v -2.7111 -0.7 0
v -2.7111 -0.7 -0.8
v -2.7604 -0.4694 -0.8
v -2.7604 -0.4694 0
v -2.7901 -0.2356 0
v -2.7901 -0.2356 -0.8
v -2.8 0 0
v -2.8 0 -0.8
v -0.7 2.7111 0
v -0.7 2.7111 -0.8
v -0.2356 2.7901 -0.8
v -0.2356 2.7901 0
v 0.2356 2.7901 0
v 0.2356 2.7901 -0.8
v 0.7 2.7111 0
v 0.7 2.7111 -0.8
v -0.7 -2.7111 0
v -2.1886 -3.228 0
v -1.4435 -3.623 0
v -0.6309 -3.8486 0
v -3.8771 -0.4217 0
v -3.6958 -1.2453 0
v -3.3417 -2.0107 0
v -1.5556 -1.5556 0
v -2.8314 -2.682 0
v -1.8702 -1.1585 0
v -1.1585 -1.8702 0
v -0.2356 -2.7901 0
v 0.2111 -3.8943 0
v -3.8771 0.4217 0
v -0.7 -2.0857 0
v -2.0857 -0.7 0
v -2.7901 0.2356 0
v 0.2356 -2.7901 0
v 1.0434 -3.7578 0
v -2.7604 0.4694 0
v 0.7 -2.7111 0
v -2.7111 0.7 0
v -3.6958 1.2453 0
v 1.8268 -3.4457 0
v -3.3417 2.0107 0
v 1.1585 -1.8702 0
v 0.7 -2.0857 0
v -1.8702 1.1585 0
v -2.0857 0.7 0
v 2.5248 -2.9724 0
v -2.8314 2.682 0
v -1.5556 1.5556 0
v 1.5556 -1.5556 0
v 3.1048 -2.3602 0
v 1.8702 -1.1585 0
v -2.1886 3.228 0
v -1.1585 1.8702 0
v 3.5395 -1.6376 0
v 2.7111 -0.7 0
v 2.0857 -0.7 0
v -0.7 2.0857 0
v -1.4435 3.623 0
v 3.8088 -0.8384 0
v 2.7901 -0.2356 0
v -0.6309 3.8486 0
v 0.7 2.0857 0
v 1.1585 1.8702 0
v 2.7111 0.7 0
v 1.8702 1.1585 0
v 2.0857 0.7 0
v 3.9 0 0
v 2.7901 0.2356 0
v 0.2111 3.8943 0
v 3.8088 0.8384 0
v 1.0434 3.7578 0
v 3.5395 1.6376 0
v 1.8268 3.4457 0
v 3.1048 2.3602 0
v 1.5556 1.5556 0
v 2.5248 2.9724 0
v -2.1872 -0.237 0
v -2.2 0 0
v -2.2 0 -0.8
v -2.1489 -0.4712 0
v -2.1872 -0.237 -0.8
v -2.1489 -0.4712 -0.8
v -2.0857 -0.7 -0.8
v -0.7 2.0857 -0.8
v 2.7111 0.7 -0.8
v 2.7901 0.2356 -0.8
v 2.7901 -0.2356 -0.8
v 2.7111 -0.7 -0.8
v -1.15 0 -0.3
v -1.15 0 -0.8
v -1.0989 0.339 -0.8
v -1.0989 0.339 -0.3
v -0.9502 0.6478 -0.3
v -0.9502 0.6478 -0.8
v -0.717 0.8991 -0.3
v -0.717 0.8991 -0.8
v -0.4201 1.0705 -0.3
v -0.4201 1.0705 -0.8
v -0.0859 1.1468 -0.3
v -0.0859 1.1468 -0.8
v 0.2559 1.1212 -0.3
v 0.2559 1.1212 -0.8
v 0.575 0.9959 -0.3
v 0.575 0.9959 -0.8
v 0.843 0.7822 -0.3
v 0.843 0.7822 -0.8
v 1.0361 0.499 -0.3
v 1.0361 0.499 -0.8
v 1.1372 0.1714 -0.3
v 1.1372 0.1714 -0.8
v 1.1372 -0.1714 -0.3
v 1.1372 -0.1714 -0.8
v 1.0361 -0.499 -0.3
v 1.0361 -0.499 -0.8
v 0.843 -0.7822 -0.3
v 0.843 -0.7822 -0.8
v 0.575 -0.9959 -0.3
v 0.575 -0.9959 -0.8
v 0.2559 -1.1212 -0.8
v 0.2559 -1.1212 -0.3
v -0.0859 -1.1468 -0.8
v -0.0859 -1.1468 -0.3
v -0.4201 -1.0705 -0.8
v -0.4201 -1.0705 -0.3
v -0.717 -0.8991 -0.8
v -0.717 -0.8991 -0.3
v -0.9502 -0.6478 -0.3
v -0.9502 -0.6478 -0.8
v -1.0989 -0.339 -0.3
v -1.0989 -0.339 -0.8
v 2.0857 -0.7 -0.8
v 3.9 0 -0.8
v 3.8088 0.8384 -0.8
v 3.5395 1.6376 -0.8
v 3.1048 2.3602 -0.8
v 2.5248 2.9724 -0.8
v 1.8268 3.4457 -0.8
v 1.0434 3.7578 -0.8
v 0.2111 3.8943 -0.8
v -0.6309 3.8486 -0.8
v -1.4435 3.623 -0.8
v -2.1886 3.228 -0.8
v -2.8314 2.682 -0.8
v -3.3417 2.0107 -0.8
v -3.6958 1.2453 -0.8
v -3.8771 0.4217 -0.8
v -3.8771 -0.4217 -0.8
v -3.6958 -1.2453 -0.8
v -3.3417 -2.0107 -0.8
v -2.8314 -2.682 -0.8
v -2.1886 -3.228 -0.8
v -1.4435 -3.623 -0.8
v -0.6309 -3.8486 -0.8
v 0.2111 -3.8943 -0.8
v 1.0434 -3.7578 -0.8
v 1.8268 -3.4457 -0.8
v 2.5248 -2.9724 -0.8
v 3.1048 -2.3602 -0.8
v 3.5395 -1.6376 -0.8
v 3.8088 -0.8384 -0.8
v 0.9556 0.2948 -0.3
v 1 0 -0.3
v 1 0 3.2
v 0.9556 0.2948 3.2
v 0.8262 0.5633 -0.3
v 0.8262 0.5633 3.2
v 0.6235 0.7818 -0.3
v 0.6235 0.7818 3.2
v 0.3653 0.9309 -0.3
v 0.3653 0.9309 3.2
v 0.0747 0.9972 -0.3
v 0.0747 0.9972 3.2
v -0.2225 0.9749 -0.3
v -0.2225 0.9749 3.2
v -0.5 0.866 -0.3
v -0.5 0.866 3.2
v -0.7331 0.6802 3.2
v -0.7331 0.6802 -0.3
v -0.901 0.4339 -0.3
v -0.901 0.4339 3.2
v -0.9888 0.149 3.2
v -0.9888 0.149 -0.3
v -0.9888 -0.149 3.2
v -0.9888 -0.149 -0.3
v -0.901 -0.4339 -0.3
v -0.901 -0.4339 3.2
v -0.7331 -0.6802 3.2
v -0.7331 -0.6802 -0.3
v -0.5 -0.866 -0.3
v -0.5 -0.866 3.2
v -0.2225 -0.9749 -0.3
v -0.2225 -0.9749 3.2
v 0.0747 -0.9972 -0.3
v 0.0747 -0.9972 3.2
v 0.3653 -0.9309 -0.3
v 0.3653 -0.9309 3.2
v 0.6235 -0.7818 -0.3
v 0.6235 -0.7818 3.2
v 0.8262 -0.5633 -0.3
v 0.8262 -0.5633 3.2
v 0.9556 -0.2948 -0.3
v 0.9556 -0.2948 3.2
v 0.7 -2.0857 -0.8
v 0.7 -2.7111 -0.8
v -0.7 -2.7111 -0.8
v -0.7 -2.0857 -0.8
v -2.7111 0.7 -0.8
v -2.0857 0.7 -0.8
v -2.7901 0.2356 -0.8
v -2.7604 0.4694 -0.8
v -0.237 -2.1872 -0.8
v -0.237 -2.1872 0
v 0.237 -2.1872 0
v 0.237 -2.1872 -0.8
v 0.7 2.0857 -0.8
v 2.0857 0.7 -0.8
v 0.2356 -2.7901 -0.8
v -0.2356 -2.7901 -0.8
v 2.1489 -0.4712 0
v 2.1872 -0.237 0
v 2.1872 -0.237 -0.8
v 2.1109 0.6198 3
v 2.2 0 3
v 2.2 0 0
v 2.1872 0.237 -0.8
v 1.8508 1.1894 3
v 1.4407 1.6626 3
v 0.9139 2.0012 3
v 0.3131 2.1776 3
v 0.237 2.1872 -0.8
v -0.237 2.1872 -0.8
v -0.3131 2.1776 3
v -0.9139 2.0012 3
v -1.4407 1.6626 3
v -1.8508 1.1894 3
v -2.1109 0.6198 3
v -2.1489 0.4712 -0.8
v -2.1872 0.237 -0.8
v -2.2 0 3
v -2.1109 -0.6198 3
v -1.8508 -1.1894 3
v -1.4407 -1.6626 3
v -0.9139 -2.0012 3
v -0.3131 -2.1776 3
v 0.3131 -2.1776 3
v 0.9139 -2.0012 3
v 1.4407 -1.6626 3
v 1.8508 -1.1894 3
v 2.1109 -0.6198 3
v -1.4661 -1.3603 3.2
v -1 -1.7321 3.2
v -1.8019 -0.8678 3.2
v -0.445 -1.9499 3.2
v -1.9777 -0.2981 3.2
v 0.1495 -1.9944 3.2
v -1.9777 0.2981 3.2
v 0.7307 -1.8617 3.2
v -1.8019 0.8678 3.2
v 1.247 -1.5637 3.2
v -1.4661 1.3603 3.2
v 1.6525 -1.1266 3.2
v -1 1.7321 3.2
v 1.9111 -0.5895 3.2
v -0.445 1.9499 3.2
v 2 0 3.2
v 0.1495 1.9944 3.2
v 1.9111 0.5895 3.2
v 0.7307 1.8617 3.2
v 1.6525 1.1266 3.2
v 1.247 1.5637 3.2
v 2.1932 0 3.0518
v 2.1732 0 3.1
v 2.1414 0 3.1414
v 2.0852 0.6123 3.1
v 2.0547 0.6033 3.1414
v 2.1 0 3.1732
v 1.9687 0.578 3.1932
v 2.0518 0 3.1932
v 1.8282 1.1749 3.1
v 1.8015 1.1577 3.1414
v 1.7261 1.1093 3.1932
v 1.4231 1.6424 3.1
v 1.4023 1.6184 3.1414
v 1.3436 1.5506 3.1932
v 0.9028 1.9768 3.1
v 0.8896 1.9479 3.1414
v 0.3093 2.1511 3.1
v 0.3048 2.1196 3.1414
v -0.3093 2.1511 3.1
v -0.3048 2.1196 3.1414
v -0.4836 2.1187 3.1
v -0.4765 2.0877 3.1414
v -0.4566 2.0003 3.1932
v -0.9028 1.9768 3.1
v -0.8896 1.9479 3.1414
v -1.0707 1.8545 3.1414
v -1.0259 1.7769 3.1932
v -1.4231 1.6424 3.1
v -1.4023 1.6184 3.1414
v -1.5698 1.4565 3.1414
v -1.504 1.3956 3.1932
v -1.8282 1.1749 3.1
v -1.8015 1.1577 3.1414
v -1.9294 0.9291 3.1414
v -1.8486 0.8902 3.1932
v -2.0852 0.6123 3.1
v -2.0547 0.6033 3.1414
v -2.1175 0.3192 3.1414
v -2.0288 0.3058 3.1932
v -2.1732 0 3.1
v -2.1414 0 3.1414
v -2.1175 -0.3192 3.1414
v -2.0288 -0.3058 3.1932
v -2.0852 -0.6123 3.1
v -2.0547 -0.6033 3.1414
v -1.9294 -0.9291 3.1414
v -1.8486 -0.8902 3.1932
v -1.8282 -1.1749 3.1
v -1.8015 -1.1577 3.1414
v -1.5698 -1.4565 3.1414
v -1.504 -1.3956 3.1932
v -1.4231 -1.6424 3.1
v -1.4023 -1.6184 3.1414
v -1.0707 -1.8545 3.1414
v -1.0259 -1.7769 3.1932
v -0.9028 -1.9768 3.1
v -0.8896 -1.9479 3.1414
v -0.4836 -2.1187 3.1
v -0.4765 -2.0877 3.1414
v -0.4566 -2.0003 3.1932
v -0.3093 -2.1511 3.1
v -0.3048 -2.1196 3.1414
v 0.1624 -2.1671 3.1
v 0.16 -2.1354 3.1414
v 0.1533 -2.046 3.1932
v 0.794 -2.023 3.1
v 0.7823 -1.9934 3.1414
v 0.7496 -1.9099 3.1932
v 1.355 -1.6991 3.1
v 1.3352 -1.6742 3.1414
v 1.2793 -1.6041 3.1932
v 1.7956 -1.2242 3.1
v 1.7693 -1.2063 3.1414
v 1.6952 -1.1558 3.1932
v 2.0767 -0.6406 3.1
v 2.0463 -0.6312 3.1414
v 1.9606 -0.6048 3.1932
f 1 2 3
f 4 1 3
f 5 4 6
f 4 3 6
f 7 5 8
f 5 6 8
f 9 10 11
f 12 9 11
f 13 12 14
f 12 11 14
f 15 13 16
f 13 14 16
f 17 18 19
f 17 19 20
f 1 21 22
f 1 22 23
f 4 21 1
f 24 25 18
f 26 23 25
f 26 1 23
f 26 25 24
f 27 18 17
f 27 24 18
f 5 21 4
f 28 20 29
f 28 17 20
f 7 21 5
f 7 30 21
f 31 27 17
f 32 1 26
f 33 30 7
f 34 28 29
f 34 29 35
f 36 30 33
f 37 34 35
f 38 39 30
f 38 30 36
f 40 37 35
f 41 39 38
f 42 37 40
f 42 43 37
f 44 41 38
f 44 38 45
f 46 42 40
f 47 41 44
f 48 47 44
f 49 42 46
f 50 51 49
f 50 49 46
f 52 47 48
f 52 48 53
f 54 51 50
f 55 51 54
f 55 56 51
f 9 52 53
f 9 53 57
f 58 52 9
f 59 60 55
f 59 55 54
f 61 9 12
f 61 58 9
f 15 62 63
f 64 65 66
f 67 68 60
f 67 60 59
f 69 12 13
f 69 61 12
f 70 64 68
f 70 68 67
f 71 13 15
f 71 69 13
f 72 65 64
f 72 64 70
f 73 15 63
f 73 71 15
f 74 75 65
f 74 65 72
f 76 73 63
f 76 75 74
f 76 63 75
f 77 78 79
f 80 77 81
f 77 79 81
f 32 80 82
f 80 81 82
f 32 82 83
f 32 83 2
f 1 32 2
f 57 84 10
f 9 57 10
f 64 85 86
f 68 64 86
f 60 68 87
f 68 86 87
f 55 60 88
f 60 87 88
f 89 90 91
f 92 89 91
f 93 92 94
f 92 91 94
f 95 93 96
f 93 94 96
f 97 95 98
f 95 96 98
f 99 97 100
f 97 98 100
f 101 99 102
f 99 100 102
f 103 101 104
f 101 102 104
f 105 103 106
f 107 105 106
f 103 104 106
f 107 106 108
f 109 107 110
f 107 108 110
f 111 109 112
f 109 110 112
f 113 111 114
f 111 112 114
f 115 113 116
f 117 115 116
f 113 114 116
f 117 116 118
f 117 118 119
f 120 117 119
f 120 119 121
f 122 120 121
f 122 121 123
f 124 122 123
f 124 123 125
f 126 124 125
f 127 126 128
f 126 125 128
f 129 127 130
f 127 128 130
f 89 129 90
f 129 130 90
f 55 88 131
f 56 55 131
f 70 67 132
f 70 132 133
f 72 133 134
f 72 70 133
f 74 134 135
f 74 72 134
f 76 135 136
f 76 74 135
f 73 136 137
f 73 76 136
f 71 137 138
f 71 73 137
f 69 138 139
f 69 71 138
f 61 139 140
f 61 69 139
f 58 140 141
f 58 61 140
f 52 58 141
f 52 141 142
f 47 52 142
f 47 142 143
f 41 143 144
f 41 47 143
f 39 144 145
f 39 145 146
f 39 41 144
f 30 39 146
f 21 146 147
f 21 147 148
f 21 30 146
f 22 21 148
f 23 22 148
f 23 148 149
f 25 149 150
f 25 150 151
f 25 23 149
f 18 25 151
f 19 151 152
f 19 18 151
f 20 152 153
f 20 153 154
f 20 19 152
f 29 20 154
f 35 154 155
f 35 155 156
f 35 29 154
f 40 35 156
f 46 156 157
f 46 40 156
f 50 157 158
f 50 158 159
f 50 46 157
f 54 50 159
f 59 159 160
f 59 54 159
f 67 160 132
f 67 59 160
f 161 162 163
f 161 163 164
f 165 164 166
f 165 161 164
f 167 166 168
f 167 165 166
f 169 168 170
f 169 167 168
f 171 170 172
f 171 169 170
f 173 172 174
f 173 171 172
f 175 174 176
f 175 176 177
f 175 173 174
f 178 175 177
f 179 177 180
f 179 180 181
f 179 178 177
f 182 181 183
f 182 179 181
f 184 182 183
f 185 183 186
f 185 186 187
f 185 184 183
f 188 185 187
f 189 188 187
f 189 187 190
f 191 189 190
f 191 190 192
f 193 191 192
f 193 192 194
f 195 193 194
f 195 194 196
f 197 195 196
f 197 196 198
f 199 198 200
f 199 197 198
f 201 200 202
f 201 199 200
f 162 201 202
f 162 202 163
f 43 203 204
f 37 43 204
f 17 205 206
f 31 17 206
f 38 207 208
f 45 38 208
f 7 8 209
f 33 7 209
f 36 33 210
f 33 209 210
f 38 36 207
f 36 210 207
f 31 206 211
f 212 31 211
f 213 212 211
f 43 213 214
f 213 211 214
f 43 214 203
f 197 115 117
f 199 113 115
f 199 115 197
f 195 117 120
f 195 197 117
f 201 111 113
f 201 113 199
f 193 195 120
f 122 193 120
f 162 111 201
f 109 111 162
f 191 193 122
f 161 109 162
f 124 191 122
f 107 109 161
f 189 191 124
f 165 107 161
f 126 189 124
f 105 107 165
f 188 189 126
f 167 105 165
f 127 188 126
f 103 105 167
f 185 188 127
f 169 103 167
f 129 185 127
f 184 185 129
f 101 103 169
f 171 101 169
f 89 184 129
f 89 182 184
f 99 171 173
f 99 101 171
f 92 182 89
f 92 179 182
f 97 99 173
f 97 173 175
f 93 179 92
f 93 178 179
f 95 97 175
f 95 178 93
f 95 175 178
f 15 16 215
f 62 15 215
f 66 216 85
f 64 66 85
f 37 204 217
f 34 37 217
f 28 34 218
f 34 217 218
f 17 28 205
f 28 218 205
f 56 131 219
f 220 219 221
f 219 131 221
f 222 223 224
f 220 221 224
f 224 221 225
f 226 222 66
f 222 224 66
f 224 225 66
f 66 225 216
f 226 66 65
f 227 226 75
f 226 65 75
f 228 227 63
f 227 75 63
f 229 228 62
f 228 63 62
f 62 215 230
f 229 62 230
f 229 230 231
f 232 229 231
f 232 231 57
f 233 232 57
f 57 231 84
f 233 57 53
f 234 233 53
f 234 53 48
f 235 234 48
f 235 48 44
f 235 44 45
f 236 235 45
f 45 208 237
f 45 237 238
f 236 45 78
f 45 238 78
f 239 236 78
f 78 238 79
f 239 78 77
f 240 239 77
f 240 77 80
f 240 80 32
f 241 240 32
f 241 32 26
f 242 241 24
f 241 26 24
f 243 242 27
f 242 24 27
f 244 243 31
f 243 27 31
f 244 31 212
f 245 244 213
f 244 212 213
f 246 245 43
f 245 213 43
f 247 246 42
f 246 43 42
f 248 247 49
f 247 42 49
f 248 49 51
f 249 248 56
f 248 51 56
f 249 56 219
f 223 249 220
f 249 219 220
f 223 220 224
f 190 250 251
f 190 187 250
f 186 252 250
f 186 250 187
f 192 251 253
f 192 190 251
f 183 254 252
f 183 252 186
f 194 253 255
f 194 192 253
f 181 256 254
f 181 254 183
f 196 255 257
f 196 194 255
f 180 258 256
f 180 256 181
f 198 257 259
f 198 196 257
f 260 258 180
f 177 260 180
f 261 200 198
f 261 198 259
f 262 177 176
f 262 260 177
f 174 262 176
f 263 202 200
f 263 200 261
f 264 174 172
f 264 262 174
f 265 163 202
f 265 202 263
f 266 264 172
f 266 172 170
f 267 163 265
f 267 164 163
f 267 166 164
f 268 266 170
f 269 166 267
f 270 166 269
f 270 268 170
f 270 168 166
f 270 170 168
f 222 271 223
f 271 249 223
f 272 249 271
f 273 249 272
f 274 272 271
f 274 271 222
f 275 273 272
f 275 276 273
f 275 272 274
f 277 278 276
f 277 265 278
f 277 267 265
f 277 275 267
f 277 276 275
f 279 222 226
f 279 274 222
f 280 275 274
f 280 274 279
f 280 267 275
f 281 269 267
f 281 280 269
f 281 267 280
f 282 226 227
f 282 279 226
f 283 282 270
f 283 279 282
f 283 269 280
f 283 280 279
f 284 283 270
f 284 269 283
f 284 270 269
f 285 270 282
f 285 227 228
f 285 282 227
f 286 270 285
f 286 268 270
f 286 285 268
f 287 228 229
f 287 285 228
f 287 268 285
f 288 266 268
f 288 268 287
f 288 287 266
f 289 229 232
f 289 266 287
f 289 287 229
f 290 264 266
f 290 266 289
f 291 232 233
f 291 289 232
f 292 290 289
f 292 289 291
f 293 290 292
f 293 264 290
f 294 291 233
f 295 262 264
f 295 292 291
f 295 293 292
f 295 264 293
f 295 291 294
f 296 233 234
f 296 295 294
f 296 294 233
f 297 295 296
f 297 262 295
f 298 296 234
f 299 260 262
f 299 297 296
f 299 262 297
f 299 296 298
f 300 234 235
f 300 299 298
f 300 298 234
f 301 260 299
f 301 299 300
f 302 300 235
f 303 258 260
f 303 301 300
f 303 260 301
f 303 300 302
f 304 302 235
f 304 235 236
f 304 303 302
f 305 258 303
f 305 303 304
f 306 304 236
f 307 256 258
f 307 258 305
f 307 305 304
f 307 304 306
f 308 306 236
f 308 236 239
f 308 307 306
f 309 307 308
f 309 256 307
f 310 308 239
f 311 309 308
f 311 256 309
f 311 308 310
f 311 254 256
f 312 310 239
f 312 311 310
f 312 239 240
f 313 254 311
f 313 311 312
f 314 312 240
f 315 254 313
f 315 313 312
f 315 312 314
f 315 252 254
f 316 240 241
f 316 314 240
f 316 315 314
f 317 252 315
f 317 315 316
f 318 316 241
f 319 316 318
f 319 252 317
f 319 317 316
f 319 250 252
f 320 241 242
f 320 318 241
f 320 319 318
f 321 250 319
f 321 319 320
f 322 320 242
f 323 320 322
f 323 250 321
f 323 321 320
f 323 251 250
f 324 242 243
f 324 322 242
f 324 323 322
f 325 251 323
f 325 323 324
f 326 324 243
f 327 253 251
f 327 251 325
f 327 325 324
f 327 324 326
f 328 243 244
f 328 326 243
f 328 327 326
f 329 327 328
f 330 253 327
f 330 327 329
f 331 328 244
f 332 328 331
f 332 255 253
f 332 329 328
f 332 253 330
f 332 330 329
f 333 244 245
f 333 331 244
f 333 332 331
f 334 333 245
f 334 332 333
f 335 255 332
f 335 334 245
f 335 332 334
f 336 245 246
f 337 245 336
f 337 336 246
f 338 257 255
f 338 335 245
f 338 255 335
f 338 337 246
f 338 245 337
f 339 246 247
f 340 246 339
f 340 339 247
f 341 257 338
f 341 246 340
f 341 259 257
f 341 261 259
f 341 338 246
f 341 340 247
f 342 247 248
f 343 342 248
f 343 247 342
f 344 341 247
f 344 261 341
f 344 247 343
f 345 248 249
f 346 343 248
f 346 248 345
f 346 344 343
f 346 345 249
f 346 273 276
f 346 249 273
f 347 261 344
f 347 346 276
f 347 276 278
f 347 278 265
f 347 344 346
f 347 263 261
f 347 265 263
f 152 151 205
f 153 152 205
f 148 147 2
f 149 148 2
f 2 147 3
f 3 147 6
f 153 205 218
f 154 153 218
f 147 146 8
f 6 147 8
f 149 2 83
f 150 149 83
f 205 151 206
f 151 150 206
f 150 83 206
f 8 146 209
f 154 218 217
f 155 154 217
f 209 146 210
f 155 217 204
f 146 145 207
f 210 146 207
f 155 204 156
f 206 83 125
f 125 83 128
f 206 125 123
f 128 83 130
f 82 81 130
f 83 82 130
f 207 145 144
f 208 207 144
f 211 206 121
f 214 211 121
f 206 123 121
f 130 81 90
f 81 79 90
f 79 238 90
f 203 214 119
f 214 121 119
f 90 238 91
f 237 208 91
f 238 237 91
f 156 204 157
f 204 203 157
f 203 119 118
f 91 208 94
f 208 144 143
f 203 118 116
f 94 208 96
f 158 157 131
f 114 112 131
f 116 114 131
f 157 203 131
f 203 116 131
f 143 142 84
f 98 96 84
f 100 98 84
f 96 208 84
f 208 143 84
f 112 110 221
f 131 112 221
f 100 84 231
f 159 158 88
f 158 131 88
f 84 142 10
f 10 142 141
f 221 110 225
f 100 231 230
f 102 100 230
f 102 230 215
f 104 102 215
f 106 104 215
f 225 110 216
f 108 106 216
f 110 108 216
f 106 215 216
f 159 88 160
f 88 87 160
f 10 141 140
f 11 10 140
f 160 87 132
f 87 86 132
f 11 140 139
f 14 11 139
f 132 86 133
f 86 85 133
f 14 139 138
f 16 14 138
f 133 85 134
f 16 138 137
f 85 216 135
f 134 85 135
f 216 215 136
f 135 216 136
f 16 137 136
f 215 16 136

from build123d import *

# Parameters (mm, degrees)
SKETCH_1_R          = 3.9
SKETCH_1_R_2        = 2.2
SKETCH_1_R_3        = 1
EXTRUDE_1_DEPTH     = 0.8
SKETCH_1_4_R        = 2.2
SKETCH_1_4_R_2      = 1
EXTRUDE_2_DEPTH     = 3.2
FILLET_1_R          = 0.2
SKETCH_2_R          = 1.15
CUT_EXTRUDE_1_DEPTH = 0.5
CUT_EXTRUDE_2_REACH = 8.813


with BuildPart() as part:
    # Sketch 1 → Extrude 1 (new body)
    with BuildSketch(Plane.XY):
        Circle(SKETCH_1_R)
        Circle(SKETCH_1_R_2, mode=Mode.SUBTRACT)
        Circle(SKETCH_1_R_2)
        Circle(SKETCH_1_R_3, mode=Mode.SUBTRACT)
    extrude(amount=-EXTRUDE_1_DEPTH)

    # Sketch 1_4 → Extrude 2 (add)
    with BuildSketch(Plane.XY):
        Circle(SKETCH_1_4_R)
        Circle(SKETCH_1_4_R_2, mode=Mode.SUBTRACT)
    extrude(amount=EXTRUDE_2_DEPTH)

    # Fillet 1
    fillet_1_edges = [part.edges().sort_by_distance(p)[0] for p in [
        (-2.2, 0, 3.2),
    ]]
    fillet(fillet_1_edges, radius=FILLET_1_R)

    # Sketch 2 → Cut-Extrude 1 (cut)
    with BuildSketch(Plane(origin=(0, 0, -0.8), x_dir=(-1, 0, 0), z_dir=(0, 0, -1))):
        Circle(SKETCH_2_R)
    extrude(amount=-CUT_EXTRUDE_1_DEPTH, mode=Mode.SUBTRACT)

    # Sketch 3 → Cut-Extrude 2 (cut, up to next)
    with BuildSketch(Plane(origin=(0, 0, -0.8), x_dir=(-1, 0, 0), z_dir=(0, 0, -1)), mode=Mode.PRIVATE) as cut_extrude_2_sk1:
        with BuildLine():
            Line((-0.7, -2.085665361), (-0.7, -2.711088342))
            ThreePointArc((-0.7, -2.711088342), (0, -2.8), (0.7, -2.711088342))
            Line((0.7, -2.711088342), (0.7, -2.085665361))
            ThreePointArc((0.7, -2.085665361), (0, -2.2), (-0.7, -2.085665361))
        make_face()
    cut_extrude_2_tool1 = extrude(cut_extrude_2_sk1.sketch, amount=-CUT_EXTRUDE_2_REACH, mode=Mode.PRIVATE) & part.part
    # Sketch 3 → Cut-Extrude 2 (cut, up to next)
    with BuildSketch(Plane(origin=(0, 0, -0.8), x_dir=(-1, 0, 0), z_dir=(0, 0, -1)), mode=Mode.PRIVATE) as cut_extrude_2_sk2:
        with BuildLine():
            ThreePointArc((0.7, 2.711088342), (0, 2.8), (-0.7, 2.711088342))
            Line((-0.7, 2.711088342), (-0.7, 2.085665361))
            ThreePointArc((-0.7, 2.085665361), (0, 2.2), (0.7, 2.085665361))
            Line((0.7, 2.085665361), (0.7, 2.711088342))
        make_face()
    cut_extrude_2_tool2 = extrude(cut_extrude_2_sk2.sketch, amount=-CUT_EXTRUDE_2_REACH, mode=Mode.PRIVATE) & part.part
    # Sketch 3 → Cut-Extrude 2 (cut, up to next)
    with BuildSketch(Plane(origin=(0, 0, -0.8), x_dir=(-1, 0, 0), z_dir=(0, 0, -1)), mode=Mode.PRIVATE) as cut_extrude_2_sk3:
        with BuildLine():
            Line((-0.7, -2.085665361), (-0.7, -2.711088342))
            ThreePointArc((-0.7, -2.711088342), (0, -2.8), (0.7, -2.711088342))
            Line((0.7, -2.711088342), (0.7, -2.085665361))
            ThreePointArc((0.7, -2.085665361), (0, -2.2), (-0.7, -2.085665361))
        make_face()
    cut_extrude_2_tool3 = extrude(cut_extrude_2_sk3.sketch, amount=-CUT_EXTRUDE_2_REACH, mode=Mode.PRIVATE) & part.part
    # Sketch 3 → Cut-Extrude 2 (cut, up to next)
    with BuildSketch(Plane(origin=(0, 0, -0.8), x_dir=(-1, 0, 0), z_dir=(0, 0, -1)), mode=Mode.PRIVATE) as cut_extrude_2_sk4:
        with BuildLine():
            ThreePointArc((0.7, 2.711088342), (0, 2.8), (-0.7, 2.711088342))
            Line((-0.7, 2.711088342), (-0.7, 2.085665361))
            ThreePointArc((-0.7, 2.085665361), (0, 2.2), (0.7, 2.085665361))
            Line((0.7, 2.085665361), (0.7, 2.711088342))
        make_face()
    cut_extrude_2_tool4 = extrude(cut_extrude_2_sk4.sketch, amount=-CUT_EXTRUDE_2_REACH, mode=Mode.PRIVATE) & part.part
    # Sketch 3 → Cut-Extrude 2 (cut, up to next)
    with BuildSketch(Plane(origin=(0, 0, -0.8), x_dir=(-1, 0, 0), z_dir=(0, 0, -1)), mode=Mode.PRIVATE) as cut_extrude_2_sk5:
        with BuildLine():
            ThreePointArc((-2.711088342, 0.7), (-2.8, 0), (-2.711088342, -0.7))
            Line((-2.711088342, -0.7), (-2.085665361, -0.7))
            ThreePointArc((-2.085665361, -0.7), (-2.2, 0), (-2.085665361, 0.7))
            Line((-2.085665361, 0.7), (-2.711088342, 0.7))
        make_face()
    cut_extrude_2_tool5 = extrude(cut_extrude_2_sk5.sketch, amount=-CUT_EXTRUDE_2_REACH, mode=Mode.PRIVATE) & part.part
    # Sketch 3 → Cut-Extrude 2 (cut, up to next)
    with BuildSketch(Plane(origin=(0, 0, -0.8), x_dir=(-1, 0, 0), z_dir=(0, 0, -1)), mode=Mode.PRIVATE) as cut_extrude_2_sk6:
        with BuildLine():
            Line((2.085665361, -0.7), (2.711088342, -0.7))
            ThreePointArc((2.711088342, -0.7), (2.77768315, -0.352812019), (2.8, 0))
            ThreePointArc((2.8, 0), (2.77768315, 0.352812019), (2.711088342, 0.7))
            Line((2.711088342, 0.7), (2.085665361, 0.7))
            ThreePointArc((2.085665361, 0.7), (2.1712282, 0.354637988), (2.2, 0))
            ThreePointArc((2.2, 0), (2.1712282, -0.354637988), (2.085665361, -0.7))
        make_face()
    cut_extrude_2_tool6 = extrude(cut_extrude_2_sk6.sketch, amount=-CUT_EXTRUDE_2_REACH, mode=Mode.PRIVATE) & part.part
    # Sketch 3 → Cut-Extrude 2 (cut, up to next)
    with BuildSketch(Plane(origin=(0, 0, -0.8), x_dir=(-1, 0, 0), z_dir=(0, 0, -1)), mode=Mode.PRIVATE) as cut_extrude_2_sk7:
        with BuildLine():
            ThreePointArc((-2.711088342, 0.7), (-2.8, 0), (-2.711088342, -0.7))
            Line((-2.711088342, -0.7), (-2.085665361, -0.7))
            ThreePointArc((-2.085665361, -0.7), (-2.2, 0), (-2.085665361, 0.7))
            Line((-2.085665361, 0.7), (-2.711088342, 0.7))
        make_face()
    cut_extrude_2_tool7 = extrude(cut_extrude_2_sk7.sketch, amount=-CUT_EXTRUDE_2_REACH, mode=Mode.PRIVATE) & part.part
    # Sketch 3 → Cut-Extrude 2 (cut, up to next)
    with BuildSketch(Plane(origin=(0, 0, -0.8), x_dir=(-1, 0, 0), z_dir=(0, 0, -1)), mode=Mode.PRIVATE) as cut_extrude_2_sk8:
        with BuildLine():
            Line((2.085665361, -0.7), (2.711088342, -0.7))
            ThreePointArc((2.711088342, -0.7), (2.77768315, -0.352812019), (2.8, 0))
            ThreePointArc((2.8, 0), (2.77768315, 0.352812019), (2.711088342, 0.7))
            Line((2.711088342, 0.7), (2.085665361, 0.7))
            ThreePointArc((2.085665361, 0.7), (2.1712282, 0.354637988), (2.2, 0))
            ThreePointArc((2.2, 0), (2.1712282, -0.354637988), (2.085665361, -0.7))
        make_face()
    cut_extrude_2_tool8 = extrude(cut_extrude_2_sk8.sketch, amount=-CUT_EXTRUDE_2_REACH, mode=Mode.PRIVATE) & part.part
    add(cut_extrude_2_tool1.solids().sort_by_distance((0, -2.466051, -0.8))[0], mode=Mode.SUBTRACT)
    add(cut_extrude_2_tool2.solids().sort_by_distance((0, 2.466051, -0.8))[0], mode=Mode.SUBTRACT)
    add(cut_extrude_2_tool3.solids().sort_by_distance((0, -2.466051, -0.8))[0], mode=Mode.SUBTRACT)
    add(cut_extrude_2_tool4.solids().sort_by_distance((0, 2.466051, -0.8))[0], mode=Mode.SUBTRACT)
    add(cut_extrude_2_tool5.solids().sort_by_distance((2.466051, 0, -0.8))[0], mode=Mode.SUBTRACT)
    add(cut_extrude_2_tool6.solids().sort_by_distance((-2.466051, 0, -0.8))[0], mode=Mode.SUBTRACT)
    add(cut_extrude_2_tool7.solids().sort_by_distance((2.466051, 0, -0.8))[0], mode=Mode.SUBTRACT)
    add(cut_extrude_2_tool8.solids().sort_by_distance((-2.466051, 0, -0.8))[0], mode=Mode.SUBTRACT)


solid = part.part
